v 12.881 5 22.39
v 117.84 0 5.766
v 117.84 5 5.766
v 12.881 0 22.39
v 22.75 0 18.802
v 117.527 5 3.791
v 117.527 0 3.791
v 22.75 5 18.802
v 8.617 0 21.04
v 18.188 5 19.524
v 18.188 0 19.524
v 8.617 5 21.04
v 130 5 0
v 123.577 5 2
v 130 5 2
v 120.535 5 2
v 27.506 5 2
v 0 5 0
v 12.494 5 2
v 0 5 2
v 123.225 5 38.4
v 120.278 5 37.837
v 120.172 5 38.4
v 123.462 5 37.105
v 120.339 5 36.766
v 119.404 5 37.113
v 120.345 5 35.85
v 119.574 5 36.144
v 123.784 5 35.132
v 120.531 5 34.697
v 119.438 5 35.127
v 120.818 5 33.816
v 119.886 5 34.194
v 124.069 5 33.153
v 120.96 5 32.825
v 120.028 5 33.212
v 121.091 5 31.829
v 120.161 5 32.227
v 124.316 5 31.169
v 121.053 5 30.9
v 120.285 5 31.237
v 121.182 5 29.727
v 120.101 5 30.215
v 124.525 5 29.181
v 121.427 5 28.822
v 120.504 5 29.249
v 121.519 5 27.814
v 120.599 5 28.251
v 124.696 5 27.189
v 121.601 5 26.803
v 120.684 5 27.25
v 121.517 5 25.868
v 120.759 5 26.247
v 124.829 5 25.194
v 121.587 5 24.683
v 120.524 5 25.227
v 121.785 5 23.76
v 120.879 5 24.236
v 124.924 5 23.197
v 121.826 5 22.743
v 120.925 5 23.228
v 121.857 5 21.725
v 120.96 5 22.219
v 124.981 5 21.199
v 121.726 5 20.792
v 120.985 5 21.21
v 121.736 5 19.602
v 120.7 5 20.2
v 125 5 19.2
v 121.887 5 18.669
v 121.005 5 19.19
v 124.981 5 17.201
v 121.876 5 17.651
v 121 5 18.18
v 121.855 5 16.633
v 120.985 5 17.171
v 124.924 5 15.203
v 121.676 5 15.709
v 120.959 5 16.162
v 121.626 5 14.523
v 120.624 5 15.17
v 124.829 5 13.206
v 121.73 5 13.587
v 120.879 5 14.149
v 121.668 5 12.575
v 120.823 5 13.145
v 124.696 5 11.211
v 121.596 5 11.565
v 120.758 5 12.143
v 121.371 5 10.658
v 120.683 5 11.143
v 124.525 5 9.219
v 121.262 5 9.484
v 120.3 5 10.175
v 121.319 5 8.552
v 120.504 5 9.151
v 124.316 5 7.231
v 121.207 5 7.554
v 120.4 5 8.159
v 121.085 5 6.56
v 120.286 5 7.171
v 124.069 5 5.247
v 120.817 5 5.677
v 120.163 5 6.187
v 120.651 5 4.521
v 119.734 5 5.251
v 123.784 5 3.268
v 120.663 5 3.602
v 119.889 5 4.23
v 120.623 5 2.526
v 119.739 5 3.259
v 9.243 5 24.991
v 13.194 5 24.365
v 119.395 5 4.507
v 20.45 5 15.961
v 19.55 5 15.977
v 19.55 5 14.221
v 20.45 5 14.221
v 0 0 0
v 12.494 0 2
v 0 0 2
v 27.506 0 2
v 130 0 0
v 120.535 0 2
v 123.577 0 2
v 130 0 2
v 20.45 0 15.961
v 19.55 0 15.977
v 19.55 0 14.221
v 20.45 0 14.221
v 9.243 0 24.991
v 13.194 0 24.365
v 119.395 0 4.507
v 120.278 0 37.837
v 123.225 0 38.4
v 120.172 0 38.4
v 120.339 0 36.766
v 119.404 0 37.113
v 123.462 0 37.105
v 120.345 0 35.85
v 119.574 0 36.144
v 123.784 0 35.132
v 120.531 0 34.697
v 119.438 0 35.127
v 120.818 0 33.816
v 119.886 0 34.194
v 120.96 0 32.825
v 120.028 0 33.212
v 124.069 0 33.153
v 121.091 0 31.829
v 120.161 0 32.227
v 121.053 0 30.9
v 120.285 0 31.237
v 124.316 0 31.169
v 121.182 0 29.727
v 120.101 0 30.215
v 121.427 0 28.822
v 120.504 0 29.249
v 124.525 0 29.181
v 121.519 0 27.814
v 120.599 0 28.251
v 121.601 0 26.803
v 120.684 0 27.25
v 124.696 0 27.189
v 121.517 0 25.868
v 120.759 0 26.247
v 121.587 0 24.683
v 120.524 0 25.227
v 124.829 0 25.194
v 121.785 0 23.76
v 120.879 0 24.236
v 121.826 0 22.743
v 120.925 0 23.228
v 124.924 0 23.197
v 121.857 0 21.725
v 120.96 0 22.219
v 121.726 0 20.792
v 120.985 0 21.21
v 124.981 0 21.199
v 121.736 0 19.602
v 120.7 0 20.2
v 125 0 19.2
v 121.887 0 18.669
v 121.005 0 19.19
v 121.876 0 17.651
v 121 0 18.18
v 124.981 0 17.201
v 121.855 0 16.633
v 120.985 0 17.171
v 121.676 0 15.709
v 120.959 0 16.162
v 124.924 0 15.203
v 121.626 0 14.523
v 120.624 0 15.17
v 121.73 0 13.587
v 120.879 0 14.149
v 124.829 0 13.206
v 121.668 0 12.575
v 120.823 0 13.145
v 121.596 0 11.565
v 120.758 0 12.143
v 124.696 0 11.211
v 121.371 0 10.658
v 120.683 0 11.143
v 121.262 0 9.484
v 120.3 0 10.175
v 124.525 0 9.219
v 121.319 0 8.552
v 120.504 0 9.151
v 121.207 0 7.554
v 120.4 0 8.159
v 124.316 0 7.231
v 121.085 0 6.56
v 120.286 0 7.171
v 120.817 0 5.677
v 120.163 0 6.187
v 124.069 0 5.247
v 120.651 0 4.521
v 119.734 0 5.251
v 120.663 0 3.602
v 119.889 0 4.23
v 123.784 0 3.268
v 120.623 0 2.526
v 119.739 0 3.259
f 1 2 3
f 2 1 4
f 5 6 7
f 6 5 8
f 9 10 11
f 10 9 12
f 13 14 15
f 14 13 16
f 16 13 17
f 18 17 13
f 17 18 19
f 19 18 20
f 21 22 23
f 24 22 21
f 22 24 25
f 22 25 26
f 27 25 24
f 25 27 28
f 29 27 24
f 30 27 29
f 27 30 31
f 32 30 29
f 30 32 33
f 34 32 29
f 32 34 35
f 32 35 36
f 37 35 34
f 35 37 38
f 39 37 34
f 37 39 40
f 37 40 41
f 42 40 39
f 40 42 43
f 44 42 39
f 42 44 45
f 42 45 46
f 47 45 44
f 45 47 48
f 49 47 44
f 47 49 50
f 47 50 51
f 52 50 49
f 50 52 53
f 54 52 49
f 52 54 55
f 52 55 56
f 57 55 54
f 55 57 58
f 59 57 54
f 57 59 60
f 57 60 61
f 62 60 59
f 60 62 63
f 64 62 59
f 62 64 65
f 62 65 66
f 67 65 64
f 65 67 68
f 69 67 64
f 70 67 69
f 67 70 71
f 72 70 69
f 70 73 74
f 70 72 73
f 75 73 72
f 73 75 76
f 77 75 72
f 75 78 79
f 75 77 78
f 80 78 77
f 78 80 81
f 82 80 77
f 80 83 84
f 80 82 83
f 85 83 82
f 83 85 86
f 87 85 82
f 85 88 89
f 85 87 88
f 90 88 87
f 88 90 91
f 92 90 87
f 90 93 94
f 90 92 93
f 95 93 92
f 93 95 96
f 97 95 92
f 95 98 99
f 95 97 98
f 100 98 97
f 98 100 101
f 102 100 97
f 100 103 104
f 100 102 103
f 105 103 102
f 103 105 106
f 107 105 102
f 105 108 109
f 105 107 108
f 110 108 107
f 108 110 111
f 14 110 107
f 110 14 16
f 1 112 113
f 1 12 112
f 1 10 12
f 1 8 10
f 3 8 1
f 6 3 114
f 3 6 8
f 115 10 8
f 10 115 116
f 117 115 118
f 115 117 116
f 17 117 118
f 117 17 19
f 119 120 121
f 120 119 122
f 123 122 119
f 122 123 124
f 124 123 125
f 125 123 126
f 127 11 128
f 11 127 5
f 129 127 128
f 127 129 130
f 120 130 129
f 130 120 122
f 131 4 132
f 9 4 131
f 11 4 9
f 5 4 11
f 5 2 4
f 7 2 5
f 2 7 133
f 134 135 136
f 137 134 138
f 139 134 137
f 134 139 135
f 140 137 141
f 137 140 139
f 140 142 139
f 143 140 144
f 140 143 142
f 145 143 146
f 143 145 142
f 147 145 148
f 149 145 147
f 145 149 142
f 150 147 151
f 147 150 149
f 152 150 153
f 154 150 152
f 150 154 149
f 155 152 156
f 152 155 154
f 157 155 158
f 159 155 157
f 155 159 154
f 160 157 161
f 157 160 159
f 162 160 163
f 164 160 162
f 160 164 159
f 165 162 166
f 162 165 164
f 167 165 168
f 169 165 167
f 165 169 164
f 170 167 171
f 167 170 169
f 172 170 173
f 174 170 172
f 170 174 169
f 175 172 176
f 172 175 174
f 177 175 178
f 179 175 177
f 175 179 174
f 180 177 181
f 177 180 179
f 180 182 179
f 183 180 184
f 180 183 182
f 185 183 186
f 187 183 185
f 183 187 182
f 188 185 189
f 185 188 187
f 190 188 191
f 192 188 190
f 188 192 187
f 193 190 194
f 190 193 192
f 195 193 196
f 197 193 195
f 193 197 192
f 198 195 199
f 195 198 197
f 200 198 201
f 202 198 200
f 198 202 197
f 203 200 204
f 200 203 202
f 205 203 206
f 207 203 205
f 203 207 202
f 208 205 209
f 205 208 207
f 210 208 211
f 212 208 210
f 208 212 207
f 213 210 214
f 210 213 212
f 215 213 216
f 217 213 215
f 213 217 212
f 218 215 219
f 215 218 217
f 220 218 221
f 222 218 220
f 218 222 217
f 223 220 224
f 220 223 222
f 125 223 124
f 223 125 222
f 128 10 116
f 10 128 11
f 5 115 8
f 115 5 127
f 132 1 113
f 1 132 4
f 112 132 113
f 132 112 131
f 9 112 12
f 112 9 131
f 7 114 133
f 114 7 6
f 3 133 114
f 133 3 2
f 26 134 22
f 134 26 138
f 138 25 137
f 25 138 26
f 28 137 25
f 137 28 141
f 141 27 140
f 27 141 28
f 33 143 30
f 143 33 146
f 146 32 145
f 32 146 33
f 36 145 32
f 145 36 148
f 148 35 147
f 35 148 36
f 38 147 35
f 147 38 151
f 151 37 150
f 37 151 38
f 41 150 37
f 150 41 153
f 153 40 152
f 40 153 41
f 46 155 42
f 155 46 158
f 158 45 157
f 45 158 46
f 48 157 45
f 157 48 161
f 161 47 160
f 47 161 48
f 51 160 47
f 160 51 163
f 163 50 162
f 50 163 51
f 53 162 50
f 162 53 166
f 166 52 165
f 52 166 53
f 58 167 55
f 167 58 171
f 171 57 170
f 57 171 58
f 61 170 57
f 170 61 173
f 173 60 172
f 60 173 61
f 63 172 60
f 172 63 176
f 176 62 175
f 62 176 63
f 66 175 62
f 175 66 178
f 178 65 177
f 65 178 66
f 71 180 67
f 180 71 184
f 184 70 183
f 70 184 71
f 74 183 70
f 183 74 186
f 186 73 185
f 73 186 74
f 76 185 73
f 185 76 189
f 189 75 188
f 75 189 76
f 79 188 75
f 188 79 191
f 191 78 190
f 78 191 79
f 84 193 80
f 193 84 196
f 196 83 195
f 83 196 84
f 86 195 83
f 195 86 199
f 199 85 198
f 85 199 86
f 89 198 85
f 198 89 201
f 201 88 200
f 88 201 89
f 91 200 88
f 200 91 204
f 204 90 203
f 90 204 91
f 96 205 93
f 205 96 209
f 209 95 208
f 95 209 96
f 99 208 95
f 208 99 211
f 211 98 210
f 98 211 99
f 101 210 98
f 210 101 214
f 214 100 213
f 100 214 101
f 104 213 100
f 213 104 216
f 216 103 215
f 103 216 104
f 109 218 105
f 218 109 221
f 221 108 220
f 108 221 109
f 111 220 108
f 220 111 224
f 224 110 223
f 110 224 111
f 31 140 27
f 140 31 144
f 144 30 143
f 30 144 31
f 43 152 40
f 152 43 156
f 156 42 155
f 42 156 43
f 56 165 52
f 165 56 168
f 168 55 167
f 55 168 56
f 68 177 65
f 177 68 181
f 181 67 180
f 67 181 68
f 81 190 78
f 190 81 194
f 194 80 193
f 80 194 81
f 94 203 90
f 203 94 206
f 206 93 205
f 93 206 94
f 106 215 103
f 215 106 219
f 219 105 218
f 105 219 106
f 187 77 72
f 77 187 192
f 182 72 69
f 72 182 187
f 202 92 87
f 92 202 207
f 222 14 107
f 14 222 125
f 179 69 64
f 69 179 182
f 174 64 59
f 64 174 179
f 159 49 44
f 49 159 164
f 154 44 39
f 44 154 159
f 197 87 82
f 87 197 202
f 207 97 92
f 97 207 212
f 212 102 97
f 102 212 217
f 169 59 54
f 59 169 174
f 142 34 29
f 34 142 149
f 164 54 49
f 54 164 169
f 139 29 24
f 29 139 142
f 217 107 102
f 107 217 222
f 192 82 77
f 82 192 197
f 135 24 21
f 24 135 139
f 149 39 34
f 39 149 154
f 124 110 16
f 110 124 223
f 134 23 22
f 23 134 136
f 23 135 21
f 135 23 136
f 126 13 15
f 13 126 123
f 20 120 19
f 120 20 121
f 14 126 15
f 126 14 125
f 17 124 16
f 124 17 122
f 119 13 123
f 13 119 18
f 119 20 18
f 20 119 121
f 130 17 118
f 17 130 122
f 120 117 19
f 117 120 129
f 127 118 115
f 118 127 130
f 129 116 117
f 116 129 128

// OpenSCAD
ratio = 10;
size = 100;

l1 = size;
l2 = size/ratio;
extend = 10;
width = 5;
bt = 2;

ah = l2;
bend_len = 1.2;
bend_thick = 0.9;


totlen = l1+l2+2*extend;

eah = ah*1.5+bend_len;

nt = floor (eah+1.0);
fbt = 5 * floor  (nt/5);

//echo ("eah = ", eah, "nt = ", nt);
//echo ("fbt = ", fbt);

module adjuster () 
{
  cube ([totlen,width, bt]);
  translate ([extend+l2,0,0]) 
    translate ([0,0,ah/2]) rotate (-90) rotate ([0,-90,0]) cylinder (r=ah,h=width, $fn=3);
  
  translate ([extend+l2-bend_thick/2,0,ah*1.5-1.]) 
    cube ([bend_thick, width, bend_len+1.5]); 
  
  translate ([extend+l2,0,eah]) {
    rotate ([0,9,0]) {

      //      translate ([0,-width/2,0]) rotate ([-90,0,0]) cylinder (r=1,h=2*width, $fs=0.2);

      translate ([0,0,bt*1.5]) {
	translate ([-l2,0,0]) cube ([l1+l2-bt*sqrt(3)/2,width, bt]);
	//  cube ([l1+l2,width/2, bt]);
	translate ([0,0,0]) 
	  rotate (90) rotate ([0,90,0]) cylinder (r=bt*2,h=width, $fn=3);
	translate ([-l2-bt,0,0]) cube ([bt*2,width, 2*bt]);
      
	translate ([l1-bt/sqrt(3),0,bt/2])   rotate ([-90,0,0]) cylinder (r=bt/sqrt(3),h=width, $fn=3);
      }
    }
    translate ([0,0,bt*1.5]) {
      for (i=[-nt:1:nt]) {
	rotate ([0,atan (i / l1),0]) translate ([l1+bt/sqrt(3)+1,0,bt/2])   rotate ([-90,,0]) rotate (180) cylinder (r=bt/sqrt(3),h=width, $fn=3);
      }
      
      for (i=[-fbt:5:fbt]) {
	rotate ([0,atan (i / l1),0]) translate ([l1+bt/sqrt(3)+1,0,bt/2])   rotate ([-90,,0]) rotate (180) cylinder (r=bt/sqrt(3)+.3,h=width, $fn=3);
	}
      
      intersection () {
	translate ([l1-width,0,-eah-1.5*bt]) cube ([width*2, width,(eah+1.5*bt)*2]);
	difference () {
	  rotate ([-90,0,0])   cylinder (r=l1+bt+3,h=width,$fa=1);
	  translate ([0,-0.1,0]) rotate ([-90,0,0])   cylinder (r=l1+bt,h=width+.2,$fa=1);
	}
      }
    }
  }
}


//rotate ([90,0,0]) 
adjuster ();
